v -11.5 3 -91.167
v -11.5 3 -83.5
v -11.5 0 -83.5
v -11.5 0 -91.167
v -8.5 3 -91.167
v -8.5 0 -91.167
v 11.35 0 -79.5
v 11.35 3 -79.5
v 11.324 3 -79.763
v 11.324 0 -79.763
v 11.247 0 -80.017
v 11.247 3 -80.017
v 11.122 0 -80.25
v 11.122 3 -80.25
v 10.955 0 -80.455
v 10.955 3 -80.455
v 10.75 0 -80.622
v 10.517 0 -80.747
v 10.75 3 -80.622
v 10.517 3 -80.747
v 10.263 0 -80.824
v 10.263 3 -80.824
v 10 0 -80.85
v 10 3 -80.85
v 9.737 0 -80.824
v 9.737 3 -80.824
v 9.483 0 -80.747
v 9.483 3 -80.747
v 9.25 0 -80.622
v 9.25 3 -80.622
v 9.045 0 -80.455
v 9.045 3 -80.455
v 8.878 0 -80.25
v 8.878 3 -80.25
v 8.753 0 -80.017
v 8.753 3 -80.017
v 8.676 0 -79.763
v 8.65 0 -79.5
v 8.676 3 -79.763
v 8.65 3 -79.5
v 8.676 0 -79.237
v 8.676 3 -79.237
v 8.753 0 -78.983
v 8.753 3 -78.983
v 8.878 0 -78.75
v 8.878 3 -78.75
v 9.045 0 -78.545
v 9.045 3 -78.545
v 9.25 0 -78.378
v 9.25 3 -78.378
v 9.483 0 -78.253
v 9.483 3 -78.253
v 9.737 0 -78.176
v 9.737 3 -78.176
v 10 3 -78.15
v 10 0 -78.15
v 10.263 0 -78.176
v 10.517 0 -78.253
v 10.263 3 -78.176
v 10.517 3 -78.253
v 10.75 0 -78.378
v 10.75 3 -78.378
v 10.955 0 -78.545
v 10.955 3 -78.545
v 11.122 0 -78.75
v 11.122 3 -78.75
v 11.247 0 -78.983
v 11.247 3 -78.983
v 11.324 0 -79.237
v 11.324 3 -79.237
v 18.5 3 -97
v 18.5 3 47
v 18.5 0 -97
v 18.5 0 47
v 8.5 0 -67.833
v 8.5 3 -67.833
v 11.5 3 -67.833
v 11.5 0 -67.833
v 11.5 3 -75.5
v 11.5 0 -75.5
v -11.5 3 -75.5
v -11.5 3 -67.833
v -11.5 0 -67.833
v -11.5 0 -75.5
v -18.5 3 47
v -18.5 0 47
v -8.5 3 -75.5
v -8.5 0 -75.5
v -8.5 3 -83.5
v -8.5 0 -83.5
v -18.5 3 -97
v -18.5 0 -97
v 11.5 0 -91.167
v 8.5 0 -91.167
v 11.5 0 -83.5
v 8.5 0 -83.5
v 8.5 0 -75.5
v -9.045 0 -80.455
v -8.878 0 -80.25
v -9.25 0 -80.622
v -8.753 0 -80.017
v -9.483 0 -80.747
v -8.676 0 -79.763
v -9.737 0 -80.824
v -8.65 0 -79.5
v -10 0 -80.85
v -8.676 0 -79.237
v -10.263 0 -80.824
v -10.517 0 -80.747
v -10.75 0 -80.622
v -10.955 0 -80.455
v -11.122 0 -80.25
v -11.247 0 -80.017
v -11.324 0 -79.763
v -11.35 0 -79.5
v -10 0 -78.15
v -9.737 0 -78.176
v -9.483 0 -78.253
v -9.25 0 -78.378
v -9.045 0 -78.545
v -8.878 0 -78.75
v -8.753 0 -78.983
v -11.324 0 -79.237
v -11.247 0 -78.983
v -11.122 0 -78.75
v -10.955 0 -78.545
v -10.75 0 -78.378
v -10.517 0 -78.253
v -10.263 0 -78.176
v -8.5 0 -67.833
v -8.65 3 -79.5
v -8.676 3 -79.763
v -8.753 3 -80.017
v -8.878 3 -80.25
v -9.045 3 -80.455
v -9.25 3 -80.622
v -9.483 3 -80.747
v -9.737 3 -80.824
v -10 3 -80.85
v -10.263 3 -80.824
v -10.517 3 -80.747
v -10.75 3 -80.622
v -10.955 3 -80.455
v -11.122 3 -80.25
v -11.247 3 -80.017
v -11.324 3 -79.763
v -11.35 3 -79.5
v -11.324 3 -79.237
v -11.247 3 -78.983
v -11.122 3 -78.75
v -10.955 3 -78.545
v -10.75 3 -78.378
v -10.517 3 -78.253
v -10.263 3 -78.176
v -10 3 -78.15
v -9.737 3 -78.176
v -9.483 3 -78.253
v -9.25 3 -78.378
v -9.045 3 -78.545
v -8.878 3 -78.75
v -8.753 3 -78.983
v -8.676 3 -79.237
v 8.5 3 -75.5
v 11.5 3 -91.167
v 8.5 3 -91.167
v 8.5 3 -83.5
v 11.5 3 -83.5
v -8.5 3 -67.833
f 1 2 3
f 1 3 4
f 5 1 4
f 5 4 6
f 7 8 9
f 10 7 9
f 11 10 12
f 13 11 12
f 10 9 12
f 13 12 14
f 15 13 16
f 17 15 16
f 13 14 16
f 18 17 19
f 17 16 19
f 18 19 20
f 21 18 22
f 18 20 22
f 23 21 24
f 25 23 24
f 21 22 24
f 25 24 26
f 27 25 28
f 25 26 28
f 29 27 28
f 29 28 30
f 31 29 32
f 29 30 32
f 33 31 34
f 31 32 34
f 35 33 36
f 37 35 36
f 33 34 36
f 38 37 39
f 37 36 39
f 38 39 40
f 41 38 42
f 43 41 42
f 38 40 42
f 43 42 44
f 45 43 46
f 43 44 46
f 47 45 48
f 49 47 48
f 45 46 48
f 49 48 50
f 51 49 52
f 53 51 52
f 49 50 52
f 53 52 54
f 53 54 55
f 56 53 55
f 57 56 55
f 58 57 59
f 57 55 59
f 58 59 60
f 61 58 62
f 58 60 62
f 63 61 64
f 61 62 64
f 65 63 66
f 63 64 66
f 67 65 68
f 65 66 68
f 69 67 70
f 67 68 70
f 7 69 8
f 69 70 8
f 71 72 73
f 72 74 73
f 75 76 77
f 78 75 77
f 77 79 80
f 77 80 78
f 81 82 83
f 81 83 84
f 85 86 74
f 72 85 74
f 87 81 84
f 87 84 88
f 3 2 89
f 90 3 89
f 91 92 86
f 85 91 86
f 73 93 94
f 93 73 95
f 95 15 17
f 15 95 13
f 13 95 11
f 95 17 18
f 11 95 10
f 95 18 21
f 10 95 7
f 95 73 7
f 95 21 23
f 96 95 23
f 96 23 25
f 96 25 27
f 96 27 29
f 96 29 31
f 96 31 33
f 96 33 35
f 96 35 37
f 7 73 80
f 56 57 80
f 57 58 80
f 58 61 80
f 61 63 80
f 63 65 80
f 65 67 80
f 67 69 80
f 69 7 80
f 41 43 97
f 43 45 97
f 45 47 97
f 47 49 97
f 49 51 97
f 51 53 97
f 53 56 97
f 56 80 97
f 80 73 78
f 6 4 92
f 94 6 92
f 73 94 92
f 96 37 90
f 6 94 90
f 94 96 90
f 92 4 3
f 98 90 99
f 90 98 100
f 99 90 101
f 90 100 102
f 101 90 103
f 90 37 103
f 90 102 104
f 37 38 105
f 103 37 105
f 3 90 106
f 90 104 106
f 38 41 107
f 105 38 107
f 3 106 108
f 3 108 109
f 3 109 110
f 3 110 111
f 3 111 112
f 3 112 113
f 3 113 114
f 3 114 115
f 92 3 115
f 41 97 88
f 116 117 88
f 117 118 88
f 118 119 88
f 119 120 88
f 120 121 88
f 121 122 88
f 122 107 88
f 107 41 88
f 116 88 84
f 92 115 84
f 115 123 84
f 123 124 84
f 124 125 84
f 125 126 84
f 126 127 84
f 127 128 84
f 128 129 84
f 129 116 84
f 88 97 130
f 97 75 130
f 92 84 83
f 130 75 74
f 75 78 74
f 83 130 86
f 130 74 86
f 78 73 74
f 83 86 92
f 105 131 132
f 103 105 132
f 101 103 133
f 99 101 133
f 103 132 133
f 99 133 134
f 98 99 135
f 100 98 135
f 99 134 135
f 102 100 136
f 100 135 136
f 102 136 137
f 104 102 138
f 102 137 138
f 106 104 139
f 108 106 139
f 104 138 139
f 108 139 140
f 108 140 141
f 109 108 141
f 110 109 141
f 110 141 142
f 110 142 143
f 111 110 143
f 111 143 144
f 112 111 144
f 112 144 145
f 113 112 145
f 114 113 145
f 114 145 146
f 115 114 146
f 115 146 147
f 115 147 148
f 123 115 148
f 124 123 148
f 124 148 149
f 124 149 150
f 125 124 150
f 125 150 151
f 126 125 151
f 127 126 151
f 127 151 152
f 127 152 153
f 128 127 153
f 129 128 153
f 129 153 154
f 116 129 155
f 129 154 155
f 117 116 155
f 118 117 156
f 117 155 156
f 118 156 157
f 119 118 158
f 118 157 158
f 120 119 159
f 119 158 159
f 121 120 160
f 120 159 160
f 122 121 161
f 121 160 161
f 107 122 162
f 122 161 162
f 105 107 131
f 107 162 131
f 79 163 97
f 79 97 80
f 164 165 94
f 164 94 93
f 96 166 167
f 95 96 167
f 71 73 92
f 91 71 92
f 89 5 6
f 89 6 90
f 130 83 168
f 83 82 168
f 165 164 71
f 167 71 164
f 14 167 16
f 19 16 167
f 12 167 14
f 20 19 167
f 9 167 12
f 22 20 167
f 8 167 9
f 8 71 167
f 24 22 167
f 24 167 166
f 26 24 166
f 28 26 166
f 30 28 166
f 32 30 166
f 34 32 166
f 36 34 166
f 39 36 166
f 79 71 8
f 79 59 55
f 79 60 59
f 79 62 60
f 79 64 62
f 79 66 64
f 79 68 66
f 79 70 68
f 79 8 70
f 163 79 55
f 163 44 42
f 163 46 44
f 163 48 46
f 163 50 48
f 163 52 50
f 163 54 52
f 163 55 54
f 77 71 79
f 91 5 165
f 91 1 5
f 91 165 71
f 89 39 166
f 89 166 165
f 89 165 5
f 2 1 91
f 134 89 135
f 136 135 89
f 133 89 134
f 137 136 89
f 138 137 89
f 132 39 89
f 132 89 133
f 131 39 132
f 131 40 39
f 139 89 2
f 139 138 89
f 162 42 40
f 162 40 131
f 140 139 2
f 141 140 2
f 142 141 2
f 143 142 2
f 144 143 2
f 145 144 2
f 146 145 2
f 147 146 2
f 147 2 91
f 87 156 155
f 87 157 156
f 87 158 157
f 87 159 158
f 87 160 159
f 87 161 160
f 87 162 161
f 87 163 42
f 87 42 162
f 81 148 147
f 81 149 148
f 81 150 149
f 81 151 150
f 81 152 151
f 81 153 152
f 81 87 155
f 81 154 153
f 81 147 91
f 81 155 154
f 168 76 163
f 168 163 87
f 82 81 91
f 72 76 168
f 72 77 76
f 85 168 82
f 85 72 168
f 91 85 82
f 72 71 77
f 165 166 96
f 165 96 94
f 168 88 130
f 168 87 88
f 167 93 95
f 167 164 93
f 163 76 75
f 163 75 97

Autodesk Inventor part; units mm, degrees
ref_plane "YZ Plane" through (0, 0, 0) normal (1, 0, 0) x (0, 1, 0)
ref_plane "XZ Plane" through (0, 0, 0) normal (0, 1, 0) x (-1, 0, 0)
ref_plane "XY Plane" through (0, 0, 0) normal (0, 0, 1) x (1, 0, 0)
sketch "Sketch2" plane through (0, 0, 0) normal (0, 1, 0) x (-1, 0, 0)
  line L0 (8.5, 37) -> (-8.5, 37)
  line L1 (-8.5, 37) -> (-8.5, -37)
  line L2 (-8.5, -37) -> (8.5, -37)
  line L3 (8.5, -37) -> (8.5, 37)
  line L4 (8.5, 37) -> (-8.5, -37) construction
  line L5 (-8.5, 37) -> (8.5, -37) construction
  line L6 (18.5, 47) -> (-18.5, 47)
  line L7 (-18.5, 47) -> (-18.5, -47)
  line L8 (-18.5, -47) -> (18.5, -47)
  line L9 (18.5, -47) -> (18.5, 47)
  line L10 (18.5, -47) -> (-18.5, -47)
  line L11 (-18.5, -47) -> (-18.5, -97)
  line L12 (-18.5, -97) -> (18.5, -97)
  line L13 (18.5, -97) -> (18.5, -47)
  point P0 (0, 0)
  dimension "d0" = 17
  dimension "d1" = 74
  dimension "d2" = 10
  dimension "d5" = 50
extrude "Extrusion1" add sketch "Sketch2" along normal blind 3 contours L3 L2 L1 L0 | L9 L8 L7 L6 | L13 L12 L11 L8
sketch "Sketch3" plane through (0, 3, 0) normal (0, 1, 0) x (1, 0, 0)
  line L0 (8.5, 67.8333) -> (8.5, 75.5) projected
  line L1 (8.5, 67.8333) -> (11.5, 67.8333) projected
  line L2 (11.5, 75.5) -> (11.5, 67.8333) projected
  line L3 (8.5, 75.5) -> (11.5, 75.5) projected
  line L4 (8.5, 83.5) -> (8.5, 91.1667) projected
  line L5 (8.5, 83.5) -> (11.5, 83.5) projected
  line L6 (11.5, 91.1667) -> (11.5, 83.5) projected
  line L7 (8.5, 91.1667) -> (11.5, 91.1667) projected
  line L8 (-11.5, 83.5) -> (-11.5, 91.1667) projected
  line L9 (-11.5, 83.5) -> (-8.5, 83.5) projected
  line L10 (-8.5, 91.1667) -> (-8.5, 83.5) projected
  line L11 (-11.5, 91.1667) -> (-8.5, 91.1667) projected
  line L12 (-11.5, 67.8333) -> (-11.5, 75.5) projected
  line L13 (-11.5, 67.8333) -> (-8.5, 67.8333) projected
  line L14 (-8.5, 75.5) -> (-8.5, 67.8333) projected
  line L15 (-11.5, 75.5) -> (-8.5, 75.5) projected
  line L16 (8.5, 75.5) -> (11.5, 83.5) construction
  line L17 (11.5, 75.5) -> (8.5, 83.5) construction
  line L18 (-8.5, 75.5) -> (-11.5, 83.5) construction
  line L19 (-11.5, 75.5) -> (-8.5, 83.5) construction
  circle A0 centre (-10, 79.5) radius 1.35
  circle A1 centre (10, 79.5) radius 1.35
  point P0 (0, 0)
  dimension "d6" = 2.7
  dimension "d7" = 2.7
extrude "Extrusion2" cut sketch "Sketch3" against normal blind 3
properties part number "bed" material "Acrylic, Clear"
